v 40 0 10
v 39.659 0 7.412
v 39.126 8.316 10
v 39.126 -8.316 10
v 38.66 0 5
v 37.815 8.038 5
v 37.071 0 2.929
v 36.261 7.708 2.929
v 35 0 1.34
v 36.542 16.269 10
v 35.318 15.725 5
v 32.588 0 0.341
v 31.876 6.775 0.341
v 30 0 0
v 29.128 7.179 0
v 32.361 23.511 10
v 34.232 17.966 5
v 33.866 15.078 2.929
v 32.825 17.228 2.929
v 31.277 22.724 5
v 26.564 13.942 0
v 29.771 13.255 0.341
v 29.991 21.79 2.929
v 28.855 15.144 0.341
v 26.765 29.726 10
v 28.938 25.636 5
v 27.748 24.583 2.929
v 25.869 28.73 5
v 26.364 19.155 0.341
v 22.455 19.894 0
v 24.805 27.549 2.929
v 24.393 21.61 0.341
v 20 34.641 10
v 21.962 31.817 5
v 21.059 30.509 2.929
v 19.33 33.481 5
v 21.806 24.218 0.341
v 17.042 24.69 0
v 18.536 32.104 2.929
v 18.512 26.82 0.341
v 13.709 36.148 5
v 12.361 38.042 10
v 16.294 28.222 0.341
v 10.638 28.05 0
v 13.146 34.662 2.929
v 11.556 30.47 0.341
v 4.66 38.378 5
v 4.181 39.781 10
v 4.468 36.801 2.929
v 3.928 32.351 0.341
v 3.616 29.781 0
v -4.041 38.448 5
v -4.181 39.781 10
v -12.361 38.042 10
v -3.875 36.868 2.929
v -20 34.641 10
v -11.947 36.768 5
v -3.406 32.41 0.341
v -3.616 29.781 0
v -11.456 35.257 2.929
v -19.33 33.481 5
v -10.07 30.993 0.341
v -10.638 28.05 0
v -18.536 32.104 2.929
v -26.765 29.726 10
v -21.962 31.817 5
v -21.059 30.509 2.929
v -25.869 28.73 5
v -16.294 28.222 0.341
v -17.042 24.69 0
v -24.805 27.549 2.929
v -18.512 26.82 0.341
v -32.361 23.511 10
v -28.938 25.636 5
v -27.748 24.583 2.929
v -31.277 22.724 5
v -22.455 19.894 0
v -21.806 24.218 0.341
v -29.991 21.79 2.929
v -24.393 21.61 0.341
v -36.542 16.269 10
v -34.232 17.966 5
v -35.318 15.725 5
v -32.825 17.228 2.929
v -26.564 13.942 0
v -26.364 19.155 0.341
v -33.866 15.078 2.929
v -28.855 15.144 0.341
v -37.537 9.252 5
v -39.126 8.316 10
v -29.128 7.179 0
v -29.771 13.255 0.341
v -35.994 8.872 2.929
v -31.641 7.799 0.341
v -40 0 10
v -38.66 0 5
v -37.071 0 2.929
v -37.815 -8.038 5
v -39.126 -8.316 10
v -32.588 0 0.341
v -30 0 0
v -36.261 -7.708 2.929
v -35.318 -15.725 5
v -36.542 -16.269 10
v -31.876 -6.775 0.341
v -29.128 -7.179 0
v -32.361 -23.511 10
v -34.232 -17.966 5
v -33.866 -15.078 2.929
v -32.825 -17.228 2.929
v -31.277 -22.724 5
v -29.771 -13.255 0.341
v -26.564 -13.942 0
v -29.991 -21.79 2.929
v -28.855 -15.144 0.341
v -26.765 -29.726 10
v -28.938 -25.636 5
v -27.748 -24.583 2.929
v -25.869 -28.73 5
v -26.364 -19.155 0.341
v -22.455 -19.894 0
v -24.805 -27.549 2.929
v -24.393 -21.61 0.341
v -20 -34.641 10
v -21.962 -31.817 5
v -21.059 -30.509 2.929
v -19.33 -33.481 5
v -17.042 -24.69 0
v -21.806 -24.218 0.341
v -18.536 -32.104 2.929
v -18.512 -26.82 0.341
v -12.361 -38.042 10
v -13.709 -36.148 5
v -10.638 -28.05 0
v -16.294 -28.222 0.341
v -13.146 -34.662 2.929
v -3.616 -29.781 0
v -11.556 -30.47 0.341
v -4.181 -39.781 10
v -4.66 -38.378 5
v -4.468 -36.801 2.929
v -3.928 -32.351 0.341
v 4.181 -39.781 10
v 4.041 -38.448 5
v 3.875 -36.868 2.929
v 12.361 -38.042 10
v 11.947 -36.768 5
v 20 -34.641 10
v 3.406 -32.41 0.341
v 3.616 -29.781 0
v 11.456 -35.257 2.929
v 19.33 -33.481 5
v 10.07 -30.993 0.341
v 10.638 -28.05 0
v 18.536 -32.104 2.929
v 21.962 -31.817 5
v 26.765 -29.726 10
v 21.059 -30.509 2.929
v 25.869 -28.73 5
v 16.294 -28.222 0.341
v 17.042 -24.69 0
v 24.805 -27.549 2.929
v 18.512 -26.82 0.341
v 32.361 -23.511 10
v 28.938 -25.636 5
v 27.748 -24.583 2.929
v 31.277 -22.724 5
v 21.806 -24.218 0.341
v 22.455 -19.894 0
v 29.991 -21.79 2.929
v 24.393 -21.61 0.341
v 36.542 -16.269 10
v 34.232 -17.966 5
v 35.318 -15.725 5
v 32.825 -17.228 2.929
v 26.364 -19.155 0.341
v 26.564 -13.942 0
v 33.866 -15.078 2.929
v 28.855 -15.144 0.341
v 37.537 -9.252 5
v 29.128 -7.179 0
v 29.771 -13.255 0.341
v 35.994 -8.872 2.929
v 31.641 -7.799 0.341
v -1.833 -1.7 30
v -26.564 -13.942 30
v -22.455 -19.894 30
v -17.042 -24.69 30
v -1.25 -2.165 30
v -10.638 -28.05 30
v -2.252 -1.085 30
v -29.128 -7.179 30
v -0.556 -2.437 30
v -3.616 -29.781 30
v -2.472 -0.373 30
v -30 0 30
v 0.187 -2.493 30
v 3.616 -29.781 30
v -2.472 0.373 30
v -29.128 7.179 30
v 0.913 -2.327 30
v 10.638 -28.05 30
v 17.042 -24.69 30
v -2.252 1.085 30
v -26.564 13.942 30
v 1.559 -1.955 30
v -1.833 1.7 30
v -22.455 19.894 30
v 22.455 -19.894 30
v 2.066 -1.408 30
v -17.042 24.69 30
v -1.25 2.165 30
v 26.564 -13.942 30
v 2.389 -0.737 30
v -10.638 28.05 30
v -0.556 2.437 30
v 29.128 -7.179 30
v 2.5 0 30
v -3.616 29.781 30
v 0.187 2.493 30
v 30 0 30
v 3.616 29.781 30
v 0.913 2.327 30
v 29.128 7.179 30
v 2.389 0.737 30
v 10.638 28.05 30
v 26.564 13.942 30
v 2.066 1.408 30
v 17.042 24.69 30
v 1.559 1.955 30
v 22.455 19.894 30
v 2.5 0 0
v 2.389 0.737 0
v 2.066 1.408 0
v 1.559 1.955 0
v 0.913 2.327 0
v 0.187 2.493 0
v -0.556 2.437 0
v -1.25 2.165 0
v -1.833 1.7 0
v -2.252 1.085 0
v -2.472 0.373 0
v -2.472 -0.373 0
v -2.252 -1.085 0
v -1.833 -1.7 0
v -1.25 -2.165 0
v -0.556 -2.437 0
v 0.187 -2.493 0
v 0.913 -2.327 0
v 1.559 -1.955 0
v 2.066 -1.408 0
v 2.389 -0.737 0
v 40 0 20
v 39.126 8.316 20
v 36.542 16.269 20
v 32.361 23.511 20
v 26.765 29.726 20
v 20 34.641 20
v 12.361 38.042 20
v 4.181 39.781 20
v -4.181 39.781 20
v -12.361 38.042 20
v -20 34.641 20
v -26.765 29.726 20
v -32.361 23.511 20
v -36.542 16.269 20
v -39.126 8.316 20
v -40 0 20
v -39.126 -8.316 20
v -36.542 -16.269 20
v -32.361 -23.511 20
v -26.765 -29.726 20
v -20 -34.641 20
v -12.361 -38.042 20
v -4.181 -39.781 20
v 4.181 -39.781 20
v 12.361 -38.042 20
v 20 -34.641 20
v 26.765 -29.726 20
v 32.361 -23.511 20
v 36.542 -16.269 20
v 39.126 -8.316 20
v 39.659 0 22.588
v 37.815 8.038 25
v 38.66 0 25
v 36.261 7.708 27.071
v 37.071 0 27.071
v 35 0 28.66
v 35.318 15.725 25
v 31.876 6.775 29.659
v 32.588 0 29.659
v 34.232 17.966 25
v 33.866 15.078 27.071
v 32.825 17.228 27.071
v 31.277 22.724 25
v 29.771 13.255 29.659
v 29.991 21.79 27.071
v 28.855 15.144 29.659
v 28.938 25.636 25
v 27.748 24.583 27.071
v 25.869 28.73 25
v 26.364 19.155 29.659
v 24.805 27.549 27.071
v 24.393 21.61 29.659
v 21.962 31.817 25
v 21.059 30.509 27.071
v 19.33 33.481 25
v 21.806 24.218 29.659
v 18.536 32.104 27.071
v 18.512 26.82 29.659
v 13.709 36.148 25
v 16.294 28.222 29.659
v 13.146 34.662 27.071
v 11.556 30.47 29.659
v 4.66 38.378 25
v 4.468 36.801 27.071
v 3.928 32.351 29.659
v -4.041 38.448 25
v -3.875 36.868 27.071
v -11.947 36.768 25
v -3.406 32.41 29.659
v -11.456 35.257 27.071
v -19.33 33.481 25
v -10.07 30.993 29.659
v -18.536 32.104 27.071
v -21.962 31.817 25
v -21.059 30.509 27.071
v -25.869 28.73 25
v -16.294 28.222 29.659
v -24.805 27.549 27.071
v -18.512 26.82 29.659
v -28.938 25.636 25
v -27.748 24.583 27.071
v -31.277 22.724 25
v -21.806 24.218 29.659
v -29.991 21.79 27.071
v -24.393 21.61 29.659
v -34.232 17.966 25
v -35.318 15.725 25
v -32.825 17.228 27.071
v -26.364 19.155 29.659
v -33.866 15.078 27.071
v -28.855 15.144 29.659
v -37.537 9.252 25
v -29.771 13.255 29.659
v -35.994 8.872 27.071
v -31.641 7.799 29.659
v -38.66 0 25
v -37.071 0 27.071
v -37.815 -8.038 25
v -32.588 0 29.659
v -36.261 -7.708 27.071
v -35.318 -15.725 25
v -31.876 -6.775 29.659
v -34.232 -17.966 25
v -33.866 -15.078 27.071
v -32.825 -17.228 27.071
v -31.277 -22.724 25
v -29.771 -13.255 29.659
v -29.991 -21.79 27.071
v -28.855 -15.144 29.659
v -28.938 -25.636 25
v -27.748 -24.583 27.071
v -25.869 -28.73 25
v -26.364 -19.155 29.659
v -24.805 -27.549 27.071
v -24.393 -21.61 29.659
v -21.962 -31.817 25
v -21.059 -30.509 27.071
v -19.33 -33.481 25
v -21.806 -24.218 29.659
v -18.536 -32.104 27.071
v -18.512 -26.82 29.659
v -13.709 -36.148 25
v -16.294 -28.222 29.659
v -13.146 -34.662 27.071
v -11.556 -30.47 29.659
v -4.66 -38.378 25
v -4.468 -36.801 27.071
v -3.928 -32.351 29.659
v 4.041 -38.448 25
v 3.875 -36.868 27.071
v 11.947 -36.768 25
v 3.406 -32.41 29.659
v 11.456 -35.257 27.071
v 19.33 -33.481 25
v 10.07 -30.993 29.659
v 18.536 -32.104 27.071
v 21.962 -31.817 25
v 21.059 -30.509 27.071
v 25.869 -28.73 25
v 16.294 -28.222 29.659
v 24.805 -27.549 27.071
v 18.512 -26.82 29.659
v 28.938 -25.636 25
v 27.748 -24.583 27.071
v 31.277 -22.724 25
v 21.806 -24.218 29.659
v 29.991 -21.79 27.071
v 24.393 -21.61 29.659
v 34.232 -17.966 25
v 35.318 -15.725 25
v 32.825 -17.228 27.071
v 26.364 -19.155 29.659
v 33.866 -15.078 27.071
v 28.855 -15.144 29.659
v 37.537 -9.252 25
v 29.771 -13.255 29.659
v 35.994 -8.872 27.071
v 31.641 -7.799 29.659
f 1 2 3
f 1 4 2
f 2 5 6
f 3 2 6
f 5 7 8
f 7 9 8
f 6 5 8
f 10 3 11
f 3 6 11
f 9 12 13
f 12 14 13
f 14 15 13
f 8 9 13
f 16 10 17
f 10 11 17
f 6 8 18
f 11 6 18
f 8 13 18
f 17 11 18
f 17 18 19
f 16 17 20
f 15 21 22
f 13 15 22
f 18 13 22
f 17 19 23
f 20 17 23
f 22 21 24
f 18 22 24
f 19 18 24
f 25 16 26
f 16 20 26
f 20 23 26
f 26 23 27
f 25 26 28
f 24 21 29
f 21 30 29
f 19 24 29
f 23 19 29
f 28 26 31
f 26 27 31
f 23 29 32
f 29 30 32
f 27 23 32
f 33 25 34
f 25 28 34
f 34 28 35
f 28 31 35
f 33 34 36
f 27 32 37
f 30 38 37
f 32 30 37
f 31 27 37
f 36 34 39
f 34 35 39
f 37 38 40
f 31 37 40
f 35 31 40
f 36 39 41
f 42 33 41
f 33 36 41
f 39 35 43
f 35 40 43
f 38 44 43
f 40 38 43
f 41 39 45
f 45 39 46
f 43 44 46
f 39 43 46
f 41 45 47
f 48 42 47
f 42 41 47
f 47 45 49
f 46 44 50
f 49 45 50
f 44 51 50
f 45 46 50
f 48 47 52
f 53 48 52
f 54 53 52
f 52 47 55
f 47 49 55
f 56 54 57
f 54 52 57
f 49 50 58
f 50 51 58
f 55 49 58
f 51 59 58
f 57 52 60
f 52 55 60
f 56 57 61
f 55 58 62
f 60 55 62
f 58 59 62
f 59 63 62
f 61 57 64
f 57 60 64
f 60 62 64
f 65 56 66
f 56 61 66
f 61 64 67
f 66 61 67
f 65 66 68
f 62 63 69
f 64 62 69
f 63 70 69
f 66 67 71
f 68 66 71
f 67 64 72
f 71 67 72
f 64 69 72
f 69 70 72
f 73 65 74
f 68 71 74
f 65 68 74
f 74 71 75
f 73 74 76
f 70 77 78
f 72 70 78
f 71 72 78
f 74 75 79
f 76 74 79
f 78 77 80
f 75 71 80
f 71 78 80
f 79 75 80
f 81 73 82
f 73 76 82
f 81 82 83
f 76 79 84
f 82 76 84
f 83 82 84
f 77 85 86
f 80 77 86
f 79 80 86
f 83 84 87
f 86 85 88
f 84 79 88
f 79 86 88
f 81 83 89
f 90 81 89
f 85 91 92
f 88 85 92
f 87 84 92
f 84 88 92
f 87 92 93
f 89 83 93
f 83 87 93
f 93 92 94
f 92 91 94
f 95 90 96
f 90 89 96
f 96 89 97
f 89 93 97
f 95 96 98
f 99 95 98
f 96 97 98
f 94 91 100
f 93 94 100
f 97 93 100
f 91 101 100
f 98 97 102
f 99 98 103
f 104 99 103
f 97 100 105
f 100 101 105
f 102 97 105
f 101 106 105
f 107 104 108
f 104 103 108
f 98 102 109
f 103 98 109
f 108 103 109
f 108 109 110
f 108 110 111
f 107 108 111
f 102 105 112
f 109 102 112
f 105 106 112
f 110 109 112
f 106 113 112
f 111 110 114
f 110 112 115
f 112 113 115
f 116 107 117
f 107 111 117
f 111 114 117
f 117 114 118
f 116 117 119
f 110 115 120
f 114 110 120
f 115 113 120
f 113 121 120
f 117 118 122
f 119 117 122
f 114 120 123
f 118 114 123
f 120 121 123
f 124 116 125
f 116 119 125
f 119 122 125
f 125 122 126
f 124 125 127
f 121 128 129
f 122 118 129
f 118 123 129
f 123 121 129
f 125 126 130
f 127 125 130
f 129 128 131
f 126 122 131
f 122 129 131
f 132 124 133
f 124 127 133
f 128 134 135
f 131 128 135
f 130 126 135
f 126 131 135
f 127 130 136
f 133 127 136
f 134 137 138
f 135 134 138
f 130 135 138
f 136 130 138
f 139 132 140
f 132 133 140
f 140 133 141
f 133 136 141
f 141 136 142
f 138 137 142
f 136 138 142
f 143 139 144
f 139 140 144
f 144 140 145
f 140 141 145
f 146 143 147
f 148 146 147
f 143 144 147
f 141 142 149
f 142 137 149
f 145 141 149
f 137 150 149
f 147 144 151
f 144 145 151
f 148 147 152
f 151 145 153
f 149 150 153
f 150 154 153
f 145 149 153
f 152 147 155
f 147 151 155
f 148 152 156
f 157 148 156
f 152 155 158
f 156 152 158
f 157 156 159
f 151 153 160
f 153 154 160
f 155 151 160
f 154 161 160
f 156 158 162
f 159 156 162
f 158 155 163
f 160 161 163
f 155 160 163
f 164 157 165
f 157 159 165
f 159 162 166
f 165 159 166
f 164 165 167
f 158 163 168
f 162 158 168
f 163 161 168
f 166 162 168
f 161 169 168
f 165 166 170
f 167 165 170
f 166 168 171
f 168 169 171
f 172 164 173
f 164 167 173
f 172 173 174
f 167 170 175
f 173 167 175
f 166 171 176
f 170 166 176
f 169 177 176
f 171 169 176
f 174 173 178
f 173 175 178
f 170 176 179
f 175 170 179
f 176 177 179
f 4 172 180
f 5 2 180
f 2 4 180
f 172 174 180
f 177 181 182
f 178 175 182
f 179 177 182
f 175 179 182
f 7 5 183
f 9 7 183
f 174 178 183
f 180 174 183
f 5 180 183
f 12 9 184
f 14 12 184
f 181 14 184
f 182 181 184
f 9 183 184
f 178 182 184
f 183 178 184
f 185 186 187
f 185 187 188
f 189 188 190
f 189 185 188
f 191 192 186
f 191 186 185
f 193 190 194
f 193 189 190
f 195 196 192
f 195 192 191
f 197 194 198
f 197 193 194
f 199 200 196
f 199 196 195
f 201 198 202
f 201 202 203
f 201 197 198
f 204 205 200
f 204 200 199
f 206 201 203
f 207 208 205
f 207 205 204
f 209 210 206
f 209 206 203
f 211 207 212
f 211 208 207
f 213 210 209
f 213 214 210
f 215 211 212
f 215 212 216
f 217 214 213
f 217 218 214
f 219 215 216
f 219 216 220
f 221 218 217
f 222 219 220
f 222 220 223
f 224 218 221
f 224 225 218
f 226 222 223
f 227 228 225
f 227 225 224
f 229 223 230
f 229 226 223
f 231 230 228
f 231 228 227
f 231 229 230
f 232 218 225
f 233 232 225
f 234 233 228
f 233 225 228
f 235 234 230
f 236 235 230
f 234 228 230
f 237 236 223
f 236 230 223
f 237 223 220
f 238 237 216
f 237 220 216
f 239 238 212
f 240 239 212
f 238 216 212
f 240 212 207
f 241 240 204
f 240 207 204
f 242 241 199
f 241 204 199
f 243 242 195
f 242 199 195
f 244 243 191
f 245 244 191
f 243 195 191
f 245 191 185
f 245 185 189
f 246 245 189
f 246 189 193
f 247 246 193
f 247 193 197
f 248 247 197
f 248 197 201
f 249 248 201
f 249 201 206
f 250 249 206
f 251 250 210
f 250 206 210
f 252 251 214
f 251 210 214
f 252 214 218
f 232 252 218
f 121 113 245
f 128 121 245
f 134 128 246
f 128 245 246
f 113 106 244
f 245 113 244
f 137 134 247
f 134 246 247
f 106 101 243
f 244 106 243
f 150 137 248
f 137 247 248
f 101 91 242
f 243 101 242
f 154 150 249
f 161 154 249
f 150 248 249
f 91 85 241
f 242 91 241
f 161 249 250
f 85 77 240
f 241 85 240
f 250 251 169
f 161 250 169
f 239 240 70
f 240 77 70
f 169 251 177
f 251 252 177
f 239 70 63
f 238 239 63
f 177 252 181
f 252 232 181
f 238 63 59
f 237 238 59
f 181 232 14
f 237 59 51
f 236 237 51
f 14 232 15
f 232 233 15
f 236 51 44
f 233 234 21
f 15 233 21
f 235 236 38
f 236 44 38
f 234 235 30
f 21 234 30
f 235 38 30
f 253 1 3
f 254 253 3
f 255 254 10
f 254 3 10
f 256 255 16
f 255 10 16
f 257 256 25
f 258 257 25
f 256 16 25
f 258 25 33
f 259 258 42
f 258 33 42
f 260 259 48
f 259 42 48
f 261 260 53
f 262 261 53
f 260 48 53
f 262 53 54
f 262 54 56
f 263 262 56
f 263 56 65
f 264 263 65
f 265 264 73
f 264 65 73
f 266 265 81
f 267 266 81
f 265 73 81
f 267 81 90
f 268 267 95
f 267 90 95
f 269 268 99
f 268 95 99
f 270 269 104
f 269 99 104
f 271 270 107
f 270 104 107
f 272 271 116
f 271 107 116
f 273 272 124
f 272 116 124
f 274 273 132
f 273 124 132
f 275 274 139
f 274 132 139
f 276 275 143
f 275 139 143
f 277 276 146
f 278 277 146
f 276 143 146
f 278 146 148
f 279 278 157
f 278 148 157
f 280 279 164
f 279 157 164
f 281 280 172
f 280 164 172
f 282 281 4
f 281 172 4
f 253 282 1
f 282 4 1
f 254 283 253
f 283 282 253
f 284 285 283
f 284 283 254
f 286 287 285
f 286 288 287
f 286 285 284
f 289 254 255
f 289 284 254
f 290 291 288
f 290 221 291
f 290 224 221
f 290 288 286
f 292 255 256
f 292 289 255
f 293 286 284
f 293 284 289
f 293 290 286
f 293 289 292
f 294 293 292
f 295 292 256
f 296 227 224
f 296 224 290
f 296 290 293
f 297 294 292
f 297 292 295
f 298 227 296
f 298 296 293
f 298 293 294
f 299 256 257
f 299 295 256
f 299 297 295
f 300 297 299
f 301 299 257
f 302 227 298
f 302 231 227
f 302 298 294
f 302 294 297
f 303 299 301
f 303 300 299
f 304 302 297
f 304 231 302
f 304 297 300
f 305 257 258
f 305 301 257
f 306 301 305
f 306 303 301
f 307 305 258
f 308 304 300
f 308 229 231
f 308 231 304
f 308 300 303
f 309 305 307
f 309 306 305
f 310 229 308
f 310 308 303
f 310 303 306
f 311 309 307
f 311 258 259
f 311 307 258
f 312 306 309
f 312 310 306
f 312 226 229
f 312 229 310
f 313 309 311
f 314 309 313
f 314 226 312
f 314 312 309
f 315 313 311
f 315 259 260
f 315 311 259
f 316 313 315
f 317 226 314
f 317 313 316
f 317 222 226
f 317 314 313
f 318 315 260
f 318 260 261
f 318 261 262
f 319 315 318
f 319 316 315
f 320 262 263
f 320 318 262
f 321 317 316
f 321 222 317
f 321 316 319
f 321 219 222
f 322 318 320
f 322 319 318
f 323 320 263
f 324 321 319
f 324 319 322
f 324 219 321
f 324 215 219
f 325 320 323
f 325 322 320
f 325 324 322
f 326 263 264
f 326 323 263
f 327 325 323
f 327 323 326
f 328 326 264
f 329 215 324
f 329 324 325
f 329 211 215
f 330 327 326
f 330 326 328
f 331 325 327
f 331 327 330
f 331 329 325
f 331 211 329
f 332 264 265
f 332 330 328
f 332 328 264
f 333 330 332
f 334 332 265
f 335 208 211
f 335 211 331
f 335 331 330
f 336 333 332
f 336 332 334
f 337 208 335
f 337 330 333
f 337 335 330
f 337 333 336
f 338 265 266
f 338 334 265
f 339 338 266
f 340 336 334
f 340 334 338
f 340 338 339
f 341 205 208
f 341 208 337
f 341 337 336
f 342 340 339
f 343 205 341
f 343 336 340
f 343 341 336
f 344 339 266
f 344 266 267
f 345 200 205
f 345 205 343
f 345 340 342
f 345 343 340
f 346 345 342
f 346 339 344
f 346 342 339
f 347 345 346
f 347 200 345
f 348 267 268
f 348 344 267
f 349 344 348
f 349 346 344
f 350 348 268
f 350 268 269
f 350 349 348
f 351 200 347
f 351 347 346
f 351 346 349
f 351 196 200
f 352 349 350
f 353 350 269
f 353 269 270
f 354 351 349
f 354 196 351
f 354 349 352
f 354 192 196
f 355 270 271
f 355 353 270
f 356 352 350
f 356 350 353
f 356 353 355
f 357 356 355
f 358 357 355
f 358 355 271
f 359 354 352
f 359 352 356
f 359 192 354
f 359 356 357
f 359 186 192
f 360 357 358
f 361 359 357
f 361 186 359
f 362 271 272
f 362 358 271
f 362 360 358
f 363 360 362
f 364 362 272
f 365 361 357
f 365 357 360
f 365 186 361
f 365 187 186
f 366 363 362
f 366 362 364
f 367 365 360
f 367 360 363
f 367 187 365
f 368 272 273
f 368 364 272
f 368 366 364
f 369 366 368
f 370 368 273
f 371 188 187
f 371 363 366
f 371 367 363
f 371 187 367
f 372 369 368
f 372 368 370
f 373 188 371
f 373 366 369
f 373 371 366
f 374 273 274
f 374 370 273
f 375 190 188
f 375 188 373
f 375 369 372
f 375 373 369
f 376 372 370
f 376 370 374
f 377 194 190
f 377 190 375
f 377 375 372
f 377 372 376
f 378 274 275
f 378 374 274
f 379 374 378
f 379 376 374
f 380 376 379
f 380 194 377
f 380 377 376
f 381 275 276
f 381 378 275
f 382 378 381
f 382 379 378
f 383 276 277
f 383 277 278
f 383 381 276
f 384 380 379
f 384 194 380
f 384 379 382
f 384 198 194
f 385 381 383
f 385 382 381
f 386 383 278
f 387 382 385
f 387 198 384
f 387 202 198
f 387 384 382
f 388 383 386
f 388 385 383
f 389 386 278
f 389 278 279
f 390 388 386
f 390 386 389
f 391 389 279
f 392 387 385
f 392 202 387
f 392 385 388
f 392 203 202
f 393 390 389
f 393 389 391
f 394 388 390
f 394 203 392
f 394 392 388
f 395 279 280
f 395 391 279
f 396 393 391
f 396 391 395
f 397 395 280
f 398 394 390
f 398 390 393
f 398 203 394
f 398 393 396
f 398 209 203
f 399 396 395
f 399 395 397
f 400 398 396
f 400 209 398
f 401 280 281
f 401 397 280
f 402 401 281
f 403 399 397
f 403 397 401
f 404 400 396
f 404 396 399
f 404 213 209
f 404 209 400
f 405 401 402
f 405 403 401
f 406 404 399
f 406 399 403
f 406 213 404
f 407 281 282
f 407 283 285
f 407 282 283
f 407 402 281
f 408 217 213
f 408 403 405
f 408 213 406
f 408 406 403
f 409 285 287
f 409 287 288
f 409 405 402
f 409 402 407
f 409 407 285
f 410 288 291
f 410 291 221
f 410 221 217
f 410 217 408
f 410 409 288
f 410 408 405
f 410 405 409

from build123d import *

# Parameters (mm, degrees)
SKETCH1_R           = 40
BOSS_EXTRUDE1_DEPTH = 30
FILLET1_R           = 10
SKETCH2_R           = 2.5
CUT_EXTRUDE1_DEPTH  = 30


with BuildPart() as part:
    # Sketch1 → Boss-Extrude1 (new body)
    with BuildSketch(Plane.XY):
        Circle(SKETCH1_R)
    extrude(amount=BOSS_EXTRUDE1_DEPTH)

    # Fillet1
    fillet1_edges = [part.edges().sort_by_distance(p)[0] for p in [
        (-40, 0, 0),
        (-40, 0, 30),
    ]]
    fillet(fillet1_edges, radius=FILLET1_R)

    # Sketch2 → Cut-Extrude1 (cut)
    with BuildSketch(Plane.XY.offset(30)):
        Circle(SKETCH2_R)
    extrude(amount=-CUT_EXTRUDE1_DEPTH, mode=Mode.SUBTRACT)


solid = part.part
